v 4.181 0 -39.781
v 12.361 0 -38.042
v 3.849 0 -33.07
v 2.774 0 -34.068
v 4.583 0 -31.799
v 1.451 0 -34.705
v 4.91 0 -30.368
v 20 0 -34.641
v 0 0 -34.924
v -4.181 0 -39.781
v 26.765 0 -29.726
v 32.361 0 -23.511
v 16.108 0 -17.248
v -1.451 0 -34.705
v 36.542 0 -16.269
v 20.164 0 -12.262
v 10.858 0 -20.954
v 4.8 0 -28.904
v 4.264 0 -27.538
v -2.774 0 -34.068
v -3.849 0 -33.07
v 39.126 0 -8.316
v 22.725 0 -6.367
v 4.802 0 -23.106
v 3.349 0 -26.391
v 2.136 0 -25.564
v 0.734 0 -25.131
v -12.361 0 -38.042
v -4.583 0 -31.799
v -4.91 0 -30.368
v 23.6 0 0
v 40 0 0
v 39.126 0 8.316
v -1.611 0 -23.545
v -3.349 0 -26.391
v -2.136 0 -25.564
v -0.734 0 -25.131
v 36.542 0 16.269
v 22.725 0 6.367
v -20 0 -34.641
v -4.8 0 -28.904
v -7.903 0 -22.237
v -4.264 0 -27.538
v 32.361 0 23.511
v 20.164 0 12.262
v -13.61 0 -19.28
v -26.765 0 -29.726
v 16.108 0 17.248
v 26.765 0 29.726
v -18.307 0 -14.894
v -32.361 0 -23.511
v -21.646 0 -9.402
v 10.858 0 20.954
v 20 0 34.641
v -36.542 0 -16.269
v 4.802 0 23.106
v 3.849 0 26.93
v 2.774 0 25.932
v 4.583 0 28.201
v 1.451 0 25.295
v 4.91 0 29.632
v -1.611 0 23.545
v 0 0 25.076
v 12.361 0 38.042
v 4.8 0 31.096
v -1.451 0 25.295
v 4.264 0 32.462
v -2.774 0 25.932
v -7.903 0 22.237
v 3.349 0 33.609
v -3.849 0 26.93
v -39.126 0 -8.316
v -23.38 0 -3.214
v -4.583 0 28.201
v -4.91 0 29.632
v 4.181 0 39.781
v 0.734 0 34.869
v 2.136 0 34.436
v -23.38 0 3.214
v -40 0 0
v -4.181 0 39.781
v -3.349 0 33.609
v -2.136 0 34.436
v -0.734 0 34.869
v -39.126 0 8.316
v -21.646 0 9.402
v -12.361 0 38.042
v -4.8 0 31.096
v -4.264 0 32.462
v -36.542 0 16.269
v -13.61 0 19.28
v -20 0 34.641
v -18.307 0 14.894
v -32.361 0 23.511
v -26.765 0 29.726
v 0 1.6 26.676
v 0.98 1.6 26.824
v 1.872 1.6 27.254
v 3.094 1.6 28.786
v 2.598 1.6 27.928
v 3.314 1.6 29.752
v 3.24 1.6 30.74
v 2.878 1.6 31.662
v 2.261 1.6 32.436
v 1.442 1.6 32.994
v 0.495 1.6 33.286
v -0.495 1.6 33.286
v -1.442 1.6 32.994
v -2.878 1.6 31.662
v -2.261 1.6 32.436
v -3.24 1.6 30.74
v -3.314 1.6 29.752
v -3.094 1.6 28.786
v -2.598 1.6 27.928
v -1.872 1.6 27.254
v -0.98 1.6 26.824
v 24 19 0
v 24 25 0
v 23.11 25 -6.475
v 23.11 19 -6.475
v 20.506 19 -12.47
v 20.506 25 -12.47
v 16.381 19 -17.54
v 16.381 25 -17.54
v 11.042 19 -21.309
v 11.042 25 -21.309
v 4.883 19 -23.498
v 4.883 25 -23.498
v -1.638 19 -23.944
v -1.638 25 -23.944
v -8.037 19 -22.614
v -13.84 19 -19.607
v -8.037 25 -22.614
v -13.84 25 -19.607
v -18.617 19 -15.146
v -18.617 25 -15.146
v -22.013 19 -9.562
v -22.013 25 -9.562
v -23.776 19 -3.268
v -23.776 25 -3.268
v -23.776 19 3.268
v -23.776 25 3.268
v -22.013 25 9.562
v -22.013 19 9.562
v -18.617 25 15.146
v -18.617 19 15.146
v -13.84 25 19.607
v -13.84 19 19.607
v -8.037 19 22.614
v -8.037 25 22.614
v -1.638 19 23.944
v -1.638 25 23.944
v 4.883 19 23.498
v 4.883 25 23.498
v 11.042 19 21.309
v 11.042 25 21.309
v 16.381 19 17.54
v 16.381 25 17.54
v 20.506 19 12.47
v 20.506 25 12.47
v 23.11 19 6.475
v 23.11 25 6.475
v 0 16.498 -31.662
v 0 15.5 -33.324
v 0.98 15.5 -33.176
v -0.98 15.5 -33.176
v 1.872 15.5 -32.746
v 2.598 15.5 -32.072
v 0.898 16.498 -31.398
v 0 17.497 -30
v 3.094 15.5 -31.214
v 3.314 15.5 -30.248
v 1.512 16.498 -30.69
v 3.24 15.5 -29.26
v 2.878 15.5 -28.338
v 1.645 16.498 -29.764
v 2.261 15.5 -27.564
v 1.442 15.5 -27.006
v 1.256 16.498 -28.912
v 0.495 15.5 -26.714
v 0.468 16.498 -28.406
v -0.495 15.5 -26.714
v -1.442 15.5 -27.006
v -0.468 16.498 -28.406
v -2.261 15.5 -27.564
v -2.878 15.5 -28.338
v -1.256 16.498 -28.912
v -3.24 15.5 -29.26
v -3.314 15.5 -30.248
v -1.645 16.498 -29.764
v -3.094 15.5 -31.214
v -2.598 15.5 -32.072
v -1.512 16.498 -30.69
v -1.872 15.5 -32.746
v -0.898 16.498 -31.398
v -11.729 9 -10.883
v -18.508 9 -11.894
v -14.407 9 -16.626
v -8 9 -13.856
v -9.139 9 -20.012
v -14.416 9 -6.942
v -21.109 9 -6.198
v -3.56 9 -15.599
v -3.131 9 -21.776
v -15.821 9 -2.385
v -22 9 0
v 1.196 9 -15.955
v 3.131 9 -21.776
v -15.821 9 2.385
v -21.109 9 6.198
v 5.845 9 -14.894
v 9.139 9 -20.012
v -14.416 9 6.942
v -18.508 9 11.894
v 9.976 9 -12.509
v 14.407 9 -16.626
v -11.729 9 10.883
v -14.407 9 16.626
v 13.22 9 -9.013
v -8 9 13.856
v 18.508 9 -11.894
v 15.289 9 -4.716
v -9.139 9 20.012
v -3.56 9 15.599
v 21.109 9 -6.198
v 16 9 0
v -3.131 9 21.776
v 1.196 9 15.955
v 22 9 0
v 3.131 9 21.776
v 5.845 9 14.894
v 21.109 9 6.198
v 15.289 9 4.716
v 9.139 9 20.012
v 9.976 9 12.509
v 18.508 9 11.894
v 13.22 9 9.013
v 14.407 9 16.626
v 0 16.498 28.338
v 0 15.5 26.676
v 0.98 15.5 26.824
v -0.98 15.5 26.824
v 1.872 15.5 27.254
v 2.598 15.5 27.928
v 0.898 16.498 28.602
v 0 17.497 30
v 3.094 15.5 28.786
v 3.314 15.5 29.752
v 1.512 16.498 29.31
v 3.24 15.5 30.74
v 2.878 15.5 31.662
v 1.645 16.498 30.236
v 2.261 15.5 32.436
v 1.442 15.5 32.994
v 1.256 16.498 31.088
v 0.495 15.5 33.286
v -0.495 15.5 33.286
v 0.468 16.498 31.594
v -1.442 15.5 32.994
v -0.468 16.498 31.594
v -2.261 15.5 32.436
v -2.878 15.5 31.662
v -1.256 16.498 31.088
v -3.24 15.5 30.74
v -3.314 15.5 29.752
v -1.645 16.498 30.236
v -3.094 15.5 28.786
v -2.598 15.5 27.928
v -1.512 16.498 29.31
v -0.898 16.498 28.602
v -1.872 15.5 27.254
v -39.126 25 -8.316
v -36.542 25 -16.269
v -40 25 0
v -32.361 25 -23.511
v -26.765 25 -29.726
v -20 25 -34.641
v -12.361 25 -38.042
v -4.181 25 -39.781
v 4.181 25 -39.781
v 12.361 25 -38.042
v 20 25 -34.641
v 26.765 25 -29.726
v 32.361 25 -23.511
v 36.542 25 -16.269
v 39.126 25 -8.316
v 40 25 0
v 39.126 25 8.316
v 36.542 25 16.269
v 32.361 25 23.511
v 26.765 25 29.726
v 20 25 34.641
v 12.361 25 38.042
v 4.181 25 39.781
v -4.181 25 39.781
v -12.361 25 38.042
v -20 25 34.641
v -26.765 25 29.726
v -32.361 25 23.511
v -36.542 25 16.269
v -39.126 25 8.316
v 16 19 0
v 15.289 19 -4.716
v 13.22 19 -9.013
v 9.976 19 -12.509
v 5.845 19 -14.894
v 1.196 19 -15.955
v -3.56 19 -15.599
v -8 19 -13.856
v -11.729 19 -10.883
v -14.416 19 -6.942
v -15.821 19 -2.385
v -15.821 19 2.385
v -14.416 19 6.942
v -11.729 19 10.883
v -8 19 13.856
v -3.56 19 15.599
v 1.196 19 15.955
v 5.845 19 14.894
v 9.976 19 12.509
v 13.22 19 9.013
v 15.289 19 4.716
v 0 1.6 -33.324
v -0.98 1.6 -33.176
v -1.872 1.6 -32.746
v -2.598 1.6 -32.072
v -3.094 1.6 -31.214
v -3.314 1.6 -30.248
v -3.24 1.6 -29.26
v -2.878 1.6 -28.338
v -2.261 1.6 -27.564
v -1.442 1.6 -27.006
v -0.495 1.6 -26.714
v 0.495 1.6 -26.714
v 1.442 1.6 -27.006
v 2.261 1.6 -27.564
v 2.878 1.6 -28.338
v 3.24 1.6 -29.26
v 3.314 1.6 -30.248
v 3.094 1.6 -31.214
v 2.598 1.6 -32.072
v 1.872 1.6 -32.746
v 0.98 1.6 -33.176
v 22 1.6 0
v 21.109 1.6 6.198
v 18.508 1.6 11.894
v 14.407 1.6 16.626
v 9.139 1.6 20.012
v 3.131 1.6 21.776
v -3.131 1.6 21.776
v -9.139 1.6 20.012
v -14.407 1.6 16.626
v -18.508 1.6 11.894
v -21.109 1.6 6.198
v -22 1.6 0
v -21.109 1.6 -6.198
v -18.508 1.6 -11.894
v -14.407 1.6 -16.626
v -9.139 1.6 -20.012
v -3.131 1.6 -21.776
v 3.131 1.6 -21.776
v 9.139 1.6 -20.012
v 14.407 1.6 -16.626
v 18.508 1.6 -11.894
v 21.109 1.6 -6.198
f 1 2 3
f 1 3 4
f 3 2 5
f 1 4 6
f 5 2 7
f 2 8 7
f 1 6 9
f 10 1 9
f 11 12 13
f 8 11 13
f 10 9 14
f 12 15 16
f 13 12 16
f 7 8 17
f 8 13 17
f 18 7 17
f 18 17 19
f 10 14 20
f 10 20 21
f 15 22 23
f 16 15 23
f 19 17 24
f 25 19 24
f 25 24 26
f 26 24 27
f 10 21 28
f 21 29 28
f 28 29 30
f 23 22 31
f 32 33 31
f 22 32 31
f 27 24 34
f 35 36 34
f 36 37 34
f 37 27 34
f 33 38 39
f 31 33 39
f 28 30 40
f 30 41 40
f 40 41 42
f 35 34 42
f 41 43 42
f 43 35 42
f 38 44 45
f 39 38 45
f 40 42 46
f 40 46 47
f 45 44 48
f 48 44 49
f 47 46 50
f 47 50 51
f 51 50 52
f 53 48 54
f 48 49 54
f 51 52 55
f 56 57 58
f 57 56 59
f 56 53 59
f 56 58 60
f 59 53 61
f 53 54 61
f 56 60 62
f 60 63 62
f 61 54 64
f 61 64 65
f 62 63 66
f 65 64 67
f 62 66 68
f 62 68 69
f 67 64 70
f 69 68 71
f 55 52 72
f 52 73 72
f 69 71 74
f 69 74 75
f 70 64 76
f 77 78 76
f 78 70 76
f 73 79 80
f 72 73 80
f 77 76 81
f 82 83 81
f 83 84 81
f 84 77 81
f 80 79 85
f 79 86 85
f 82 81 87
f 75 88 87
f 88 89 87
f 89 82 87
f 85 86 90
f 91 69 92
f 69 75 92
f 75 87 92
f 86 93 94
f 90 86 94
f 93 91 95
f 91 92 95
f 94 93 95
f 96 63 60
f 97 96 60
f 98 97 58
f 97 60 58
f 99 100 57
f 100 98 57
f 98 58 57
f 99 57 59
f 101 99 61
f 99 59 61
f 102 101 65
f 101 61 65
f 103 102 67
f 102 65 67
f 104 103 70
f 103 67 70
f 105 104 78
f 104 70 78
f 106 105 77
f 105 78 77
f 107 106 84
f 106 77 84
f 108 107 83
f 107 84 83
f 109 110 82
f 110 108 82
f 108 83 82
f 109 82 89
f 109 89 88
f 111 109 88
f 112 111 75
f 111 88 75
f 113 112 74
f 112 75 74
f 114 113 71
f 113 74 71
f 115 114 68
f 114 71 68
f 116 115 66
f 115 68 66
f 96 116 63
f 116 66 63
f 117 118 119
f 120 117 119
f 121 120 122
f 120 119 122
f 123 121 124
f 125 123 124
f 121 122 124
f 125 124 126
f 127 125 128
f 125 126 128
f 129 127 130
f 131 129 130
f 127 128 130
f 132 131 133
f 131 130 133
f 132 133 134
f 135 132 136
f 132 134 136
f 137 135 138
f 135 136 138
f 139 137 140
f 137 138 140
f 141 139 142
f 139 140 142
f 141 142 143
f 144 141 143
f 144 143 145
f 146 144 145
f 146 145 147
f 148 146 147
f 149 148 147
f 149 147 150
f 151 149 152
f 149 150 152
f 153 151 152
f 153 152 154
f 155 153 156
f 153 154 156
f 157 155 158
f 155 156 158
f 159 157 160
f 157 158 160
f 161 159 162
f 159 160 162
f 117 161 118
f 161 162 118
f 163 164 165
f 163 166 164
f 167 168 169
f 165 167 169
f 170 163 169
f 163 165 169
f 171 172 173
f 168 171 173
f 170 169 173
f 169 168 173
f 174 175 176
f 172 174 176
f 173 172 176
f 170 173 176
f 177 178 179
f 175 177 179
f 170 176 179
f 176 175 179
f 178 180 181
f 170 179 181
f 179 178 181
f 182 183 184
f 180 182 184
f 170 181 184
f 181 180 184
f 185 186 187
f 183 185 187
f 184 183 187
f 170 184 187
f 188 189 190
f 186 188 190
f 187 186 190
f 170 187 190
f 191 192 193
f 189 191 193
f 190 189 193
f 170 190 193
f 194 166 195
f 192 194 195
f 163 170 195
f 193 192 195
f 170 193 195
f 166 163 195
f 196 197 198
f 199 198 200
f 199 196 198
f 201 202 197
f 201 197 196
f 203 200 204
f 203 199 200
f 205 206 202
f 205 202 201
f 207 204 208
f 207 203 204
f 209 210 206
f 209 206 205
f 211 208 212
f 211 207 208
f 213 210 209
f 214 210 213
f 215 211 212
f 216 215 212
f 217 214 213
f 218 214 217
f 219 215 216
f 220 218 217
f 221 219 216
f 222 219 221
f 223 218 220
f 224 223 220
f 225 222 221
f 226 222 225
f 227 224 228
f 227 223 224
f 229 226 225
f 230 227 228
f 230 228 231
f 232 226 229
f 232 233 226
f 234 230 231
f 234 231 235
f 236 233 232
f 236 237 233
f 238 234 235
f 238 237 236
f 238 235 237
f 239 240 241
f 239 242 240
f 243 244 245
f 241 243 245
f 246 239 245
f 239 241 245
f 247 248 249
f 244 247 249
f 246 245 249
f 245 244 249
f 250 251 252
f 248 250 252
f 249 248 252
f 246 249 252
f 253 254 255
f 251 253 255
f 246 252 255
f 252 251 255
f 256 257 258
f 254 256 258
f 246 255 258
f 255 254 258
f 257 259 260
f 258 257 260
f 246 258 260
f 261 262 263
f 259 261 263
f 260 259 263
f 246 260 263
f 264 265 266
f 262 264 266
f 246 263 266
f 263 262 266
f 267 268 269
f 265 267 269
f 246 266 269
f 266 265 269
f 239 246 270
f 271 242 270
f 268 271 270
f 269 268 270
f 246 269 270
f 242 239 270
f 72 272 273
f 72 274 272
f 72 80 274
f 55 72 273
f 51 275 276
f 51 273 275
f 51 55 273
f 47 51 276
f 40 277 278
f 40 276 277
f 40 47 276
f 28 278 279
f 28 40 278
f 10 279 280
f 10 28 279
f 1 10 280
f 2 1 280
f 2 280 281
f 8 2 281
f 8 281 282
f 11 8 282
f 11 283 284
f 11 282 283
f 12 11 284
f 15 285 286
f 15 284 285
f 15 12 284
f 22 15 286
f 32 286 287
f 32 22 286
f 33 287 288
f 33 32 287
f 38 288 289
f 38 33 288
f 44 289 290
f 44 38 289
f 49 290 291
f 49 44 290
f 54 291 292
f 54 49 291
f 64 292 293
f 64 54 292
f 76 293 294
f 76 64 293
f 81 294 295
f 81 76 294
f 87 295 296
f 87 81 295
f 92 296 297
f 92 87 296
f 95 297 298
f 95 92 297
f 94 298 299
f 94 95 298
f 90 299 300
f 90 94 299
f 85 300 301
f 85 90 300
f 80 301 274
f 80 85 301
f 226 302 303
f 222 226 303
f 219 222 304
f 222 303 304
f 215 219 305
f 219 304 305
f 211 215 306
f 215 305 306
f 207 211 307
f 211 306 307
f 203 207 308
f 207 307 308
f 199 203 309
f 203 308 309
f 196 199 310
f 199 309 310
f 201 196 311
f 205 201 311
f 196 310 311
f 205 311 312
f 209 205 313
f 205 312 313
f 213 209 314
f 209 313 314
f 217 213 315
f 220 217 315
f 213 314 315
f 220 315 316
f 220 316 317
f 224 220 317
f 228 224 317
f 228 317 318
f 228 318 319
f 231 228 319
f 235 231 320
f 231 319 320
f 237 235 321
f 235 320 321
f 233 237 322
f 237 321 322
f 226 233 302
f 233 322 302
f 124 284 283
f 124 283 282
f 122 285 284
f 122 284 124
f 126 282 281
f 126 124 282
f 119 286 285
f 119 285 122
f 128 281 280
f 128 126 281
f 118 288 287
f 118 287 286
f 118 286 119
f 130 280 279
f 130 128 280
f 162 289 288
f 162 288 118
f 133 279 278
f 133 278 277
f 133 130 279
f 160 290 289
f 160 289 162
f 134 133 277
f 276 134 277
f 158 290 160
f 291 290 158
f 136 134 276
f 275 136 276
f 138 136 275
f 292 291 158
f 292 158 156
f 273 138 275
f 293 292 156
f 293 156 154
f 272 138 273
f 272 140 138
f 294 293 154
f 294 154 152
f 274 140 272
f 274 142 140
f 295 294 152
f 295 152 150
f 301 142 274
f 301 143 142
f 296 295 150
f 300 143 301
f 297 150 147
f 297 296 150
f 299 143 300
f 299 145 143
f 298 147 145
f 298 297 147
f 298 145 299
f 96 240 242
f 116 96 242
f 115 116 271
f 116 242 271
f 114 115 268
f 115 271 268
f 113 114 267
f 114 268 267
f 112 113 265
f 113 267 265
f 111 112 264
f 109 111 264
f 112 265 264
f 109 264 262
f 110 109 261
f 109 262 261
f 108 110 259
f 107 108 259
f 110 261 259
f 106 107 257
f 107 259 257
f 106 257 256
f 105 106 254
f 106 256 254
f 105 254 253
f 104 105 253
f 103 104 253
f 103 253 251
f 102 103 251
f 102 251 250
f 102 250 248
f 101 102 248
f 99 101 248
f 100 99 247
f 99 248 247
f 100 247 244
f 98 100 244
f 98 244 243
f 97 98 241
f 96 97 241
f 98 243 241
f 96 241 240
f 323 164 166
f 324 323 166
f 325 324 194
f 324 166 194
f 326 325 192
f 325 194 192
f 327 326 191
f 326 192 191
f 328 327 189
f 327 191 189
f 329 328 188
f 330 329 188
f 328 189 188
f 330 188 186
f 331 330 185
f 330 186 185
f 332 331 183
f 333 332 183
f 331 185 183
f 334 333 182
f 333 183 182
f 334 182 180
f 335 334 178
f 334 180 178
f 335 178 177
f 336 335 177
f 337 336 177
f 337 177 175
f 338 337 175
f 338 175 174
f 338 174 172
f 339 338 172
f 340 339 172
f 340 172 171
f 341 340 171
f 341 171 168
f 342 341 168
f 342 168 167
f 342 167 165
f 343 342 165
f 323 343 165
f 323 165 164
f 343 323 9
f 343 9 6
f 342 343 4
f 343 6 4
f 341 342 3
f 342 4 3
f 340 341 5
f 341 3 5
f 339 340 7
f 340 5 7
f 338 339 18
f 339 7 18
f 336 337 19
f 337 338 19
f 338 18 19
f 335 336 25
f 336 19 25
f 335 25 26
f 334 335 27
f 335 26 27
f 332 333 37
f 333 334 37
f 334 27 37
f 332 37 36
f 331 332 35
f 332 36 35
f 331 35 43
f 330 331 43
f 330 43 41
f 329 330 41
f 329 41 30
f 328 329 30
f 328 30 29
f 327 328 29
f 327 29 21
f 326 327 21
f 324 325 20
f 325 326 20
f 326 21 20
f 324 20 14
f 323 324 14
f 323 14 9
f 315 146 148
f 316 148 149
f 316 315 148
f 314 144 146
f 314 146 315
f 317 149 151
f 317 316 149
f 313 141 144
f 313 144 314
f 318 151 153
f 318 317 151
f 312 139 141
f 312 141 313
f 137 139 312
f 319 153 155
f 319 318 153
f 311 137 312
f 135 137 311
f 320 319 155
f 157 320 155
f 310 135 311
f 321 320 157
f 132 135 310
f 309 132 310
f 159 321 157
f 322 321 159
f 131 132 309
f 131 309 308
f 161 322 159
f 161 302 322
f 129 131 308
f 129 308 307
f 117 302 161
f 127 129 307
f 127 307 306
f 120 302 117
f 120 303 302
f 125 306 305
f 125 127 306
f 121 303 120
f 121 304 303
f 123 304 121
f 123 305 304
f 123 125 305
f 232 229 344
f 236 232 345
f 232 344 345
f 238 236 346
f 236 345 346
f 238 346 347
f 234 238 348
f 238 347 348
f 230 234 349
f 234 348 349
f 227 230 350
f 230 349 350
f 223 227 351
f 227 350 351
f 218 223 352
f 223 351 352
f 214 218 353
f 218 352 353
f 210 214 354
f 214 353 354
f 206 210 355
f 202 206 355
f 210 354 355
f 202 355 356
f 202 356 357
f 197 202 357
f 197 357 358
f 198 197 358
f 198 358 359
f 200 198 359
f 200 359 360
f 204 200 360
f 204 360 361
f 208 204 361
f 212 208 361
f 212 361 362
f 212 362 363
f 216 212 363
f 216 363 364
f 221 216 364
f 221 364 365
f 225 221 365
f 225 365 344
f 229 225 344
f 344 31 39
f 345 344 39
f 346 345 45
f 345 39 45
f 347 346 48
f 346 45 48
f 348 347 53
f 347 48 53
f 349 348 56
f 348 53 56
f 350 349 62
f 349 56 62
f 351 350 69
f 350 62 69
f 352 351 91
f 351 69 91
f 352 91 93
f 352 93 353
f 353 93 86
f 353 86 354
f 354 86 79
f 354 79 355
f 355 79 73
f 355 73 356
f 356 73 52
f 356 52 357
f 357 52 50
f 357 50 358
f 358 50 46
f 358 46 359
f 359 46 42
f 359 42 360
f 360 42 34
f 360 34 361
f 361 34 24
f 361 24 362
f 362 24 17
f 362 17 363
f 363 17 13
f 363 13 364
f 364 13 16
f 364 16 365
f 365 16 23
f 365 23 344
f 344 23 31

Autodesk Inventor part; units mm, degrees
ref_plane "YZ Plane" through (0, 0, 0) normal (1, 0, 0) x (0, 1, 0)
ref_plane "XZ Plane" through (0, 0, 0) normal (0, 1, 0) x (-1, 0, 0)
ref_plane "XY Plane" through (0, 0, 0) normal (0, 0, 1) x (1, 0, 0)
sketch "Эскиз1" plane through (0, 0, 0) normal (0, 1, 0) x (-1, 0, 0)
  circle A0 centre (0, 0) radius 40
  dimension "d0" = 80
extrude "Выдавливание1" add sketch "Эскиз1" along normal blind 25
sketch "Эскиз2" plane through (0, 25, 0) normal (0, 1, 0) x (1, 0, 0)
  circle A0 centre (0, 0) radius 24
  dimension "d3" = 48
extrude "Выдавливание2" cut sketch "Эскиз2" against normal blind 6
sketch "Эскиз3" plane through (0, 19, 0) normal (0, 1, 0) x (1, 0, 0)
  circle A0 centre (0, 0) radius 16
  dimension "d6" = 32
extrude "Выдавливание3" cut sketch "Эскиз3" against normal blind 55.25
sketch "Эскиз4" plane through (0, 0, 0) normal (0, -1, 0) x (1, 0, 0)
  circle A0 centre (0, 0) radius 22
  dimension "d9" = 44
extrude "Выдавливание4" cut sketch "Эскиз4" against normal blind 9
chamfer "Фаска1" distance 1.6 angle 45 1 edges at (-22, 0, 0)
sketch "Эскиз5" plane through (0, 0, 0) normal (0, -1, 0) x (1, 0, 0)
  point P0 (0, 0)
  point P1 (0, 30)
  point P2 (0, -30)
  dimension "d15" = 30
  dimension "d16" = 30
hole "Отверстие1" at (0, 0, 30) at (0, 0, -30) direction (0, 1, 0) diameter 6.647 depth 15.5 tip angle 118 thread size "M8x1.25" class "6H" standard "ANSI Metric M Profile"
chamfer "Фаска2" distance 1.6 angle 45 1 edges at (0, 0, 33.3235)
chamfer "Фаска3" distance 1.6 angle 45 1 edges at (0, 0, -26.6765)
properties part number "Корпус"
